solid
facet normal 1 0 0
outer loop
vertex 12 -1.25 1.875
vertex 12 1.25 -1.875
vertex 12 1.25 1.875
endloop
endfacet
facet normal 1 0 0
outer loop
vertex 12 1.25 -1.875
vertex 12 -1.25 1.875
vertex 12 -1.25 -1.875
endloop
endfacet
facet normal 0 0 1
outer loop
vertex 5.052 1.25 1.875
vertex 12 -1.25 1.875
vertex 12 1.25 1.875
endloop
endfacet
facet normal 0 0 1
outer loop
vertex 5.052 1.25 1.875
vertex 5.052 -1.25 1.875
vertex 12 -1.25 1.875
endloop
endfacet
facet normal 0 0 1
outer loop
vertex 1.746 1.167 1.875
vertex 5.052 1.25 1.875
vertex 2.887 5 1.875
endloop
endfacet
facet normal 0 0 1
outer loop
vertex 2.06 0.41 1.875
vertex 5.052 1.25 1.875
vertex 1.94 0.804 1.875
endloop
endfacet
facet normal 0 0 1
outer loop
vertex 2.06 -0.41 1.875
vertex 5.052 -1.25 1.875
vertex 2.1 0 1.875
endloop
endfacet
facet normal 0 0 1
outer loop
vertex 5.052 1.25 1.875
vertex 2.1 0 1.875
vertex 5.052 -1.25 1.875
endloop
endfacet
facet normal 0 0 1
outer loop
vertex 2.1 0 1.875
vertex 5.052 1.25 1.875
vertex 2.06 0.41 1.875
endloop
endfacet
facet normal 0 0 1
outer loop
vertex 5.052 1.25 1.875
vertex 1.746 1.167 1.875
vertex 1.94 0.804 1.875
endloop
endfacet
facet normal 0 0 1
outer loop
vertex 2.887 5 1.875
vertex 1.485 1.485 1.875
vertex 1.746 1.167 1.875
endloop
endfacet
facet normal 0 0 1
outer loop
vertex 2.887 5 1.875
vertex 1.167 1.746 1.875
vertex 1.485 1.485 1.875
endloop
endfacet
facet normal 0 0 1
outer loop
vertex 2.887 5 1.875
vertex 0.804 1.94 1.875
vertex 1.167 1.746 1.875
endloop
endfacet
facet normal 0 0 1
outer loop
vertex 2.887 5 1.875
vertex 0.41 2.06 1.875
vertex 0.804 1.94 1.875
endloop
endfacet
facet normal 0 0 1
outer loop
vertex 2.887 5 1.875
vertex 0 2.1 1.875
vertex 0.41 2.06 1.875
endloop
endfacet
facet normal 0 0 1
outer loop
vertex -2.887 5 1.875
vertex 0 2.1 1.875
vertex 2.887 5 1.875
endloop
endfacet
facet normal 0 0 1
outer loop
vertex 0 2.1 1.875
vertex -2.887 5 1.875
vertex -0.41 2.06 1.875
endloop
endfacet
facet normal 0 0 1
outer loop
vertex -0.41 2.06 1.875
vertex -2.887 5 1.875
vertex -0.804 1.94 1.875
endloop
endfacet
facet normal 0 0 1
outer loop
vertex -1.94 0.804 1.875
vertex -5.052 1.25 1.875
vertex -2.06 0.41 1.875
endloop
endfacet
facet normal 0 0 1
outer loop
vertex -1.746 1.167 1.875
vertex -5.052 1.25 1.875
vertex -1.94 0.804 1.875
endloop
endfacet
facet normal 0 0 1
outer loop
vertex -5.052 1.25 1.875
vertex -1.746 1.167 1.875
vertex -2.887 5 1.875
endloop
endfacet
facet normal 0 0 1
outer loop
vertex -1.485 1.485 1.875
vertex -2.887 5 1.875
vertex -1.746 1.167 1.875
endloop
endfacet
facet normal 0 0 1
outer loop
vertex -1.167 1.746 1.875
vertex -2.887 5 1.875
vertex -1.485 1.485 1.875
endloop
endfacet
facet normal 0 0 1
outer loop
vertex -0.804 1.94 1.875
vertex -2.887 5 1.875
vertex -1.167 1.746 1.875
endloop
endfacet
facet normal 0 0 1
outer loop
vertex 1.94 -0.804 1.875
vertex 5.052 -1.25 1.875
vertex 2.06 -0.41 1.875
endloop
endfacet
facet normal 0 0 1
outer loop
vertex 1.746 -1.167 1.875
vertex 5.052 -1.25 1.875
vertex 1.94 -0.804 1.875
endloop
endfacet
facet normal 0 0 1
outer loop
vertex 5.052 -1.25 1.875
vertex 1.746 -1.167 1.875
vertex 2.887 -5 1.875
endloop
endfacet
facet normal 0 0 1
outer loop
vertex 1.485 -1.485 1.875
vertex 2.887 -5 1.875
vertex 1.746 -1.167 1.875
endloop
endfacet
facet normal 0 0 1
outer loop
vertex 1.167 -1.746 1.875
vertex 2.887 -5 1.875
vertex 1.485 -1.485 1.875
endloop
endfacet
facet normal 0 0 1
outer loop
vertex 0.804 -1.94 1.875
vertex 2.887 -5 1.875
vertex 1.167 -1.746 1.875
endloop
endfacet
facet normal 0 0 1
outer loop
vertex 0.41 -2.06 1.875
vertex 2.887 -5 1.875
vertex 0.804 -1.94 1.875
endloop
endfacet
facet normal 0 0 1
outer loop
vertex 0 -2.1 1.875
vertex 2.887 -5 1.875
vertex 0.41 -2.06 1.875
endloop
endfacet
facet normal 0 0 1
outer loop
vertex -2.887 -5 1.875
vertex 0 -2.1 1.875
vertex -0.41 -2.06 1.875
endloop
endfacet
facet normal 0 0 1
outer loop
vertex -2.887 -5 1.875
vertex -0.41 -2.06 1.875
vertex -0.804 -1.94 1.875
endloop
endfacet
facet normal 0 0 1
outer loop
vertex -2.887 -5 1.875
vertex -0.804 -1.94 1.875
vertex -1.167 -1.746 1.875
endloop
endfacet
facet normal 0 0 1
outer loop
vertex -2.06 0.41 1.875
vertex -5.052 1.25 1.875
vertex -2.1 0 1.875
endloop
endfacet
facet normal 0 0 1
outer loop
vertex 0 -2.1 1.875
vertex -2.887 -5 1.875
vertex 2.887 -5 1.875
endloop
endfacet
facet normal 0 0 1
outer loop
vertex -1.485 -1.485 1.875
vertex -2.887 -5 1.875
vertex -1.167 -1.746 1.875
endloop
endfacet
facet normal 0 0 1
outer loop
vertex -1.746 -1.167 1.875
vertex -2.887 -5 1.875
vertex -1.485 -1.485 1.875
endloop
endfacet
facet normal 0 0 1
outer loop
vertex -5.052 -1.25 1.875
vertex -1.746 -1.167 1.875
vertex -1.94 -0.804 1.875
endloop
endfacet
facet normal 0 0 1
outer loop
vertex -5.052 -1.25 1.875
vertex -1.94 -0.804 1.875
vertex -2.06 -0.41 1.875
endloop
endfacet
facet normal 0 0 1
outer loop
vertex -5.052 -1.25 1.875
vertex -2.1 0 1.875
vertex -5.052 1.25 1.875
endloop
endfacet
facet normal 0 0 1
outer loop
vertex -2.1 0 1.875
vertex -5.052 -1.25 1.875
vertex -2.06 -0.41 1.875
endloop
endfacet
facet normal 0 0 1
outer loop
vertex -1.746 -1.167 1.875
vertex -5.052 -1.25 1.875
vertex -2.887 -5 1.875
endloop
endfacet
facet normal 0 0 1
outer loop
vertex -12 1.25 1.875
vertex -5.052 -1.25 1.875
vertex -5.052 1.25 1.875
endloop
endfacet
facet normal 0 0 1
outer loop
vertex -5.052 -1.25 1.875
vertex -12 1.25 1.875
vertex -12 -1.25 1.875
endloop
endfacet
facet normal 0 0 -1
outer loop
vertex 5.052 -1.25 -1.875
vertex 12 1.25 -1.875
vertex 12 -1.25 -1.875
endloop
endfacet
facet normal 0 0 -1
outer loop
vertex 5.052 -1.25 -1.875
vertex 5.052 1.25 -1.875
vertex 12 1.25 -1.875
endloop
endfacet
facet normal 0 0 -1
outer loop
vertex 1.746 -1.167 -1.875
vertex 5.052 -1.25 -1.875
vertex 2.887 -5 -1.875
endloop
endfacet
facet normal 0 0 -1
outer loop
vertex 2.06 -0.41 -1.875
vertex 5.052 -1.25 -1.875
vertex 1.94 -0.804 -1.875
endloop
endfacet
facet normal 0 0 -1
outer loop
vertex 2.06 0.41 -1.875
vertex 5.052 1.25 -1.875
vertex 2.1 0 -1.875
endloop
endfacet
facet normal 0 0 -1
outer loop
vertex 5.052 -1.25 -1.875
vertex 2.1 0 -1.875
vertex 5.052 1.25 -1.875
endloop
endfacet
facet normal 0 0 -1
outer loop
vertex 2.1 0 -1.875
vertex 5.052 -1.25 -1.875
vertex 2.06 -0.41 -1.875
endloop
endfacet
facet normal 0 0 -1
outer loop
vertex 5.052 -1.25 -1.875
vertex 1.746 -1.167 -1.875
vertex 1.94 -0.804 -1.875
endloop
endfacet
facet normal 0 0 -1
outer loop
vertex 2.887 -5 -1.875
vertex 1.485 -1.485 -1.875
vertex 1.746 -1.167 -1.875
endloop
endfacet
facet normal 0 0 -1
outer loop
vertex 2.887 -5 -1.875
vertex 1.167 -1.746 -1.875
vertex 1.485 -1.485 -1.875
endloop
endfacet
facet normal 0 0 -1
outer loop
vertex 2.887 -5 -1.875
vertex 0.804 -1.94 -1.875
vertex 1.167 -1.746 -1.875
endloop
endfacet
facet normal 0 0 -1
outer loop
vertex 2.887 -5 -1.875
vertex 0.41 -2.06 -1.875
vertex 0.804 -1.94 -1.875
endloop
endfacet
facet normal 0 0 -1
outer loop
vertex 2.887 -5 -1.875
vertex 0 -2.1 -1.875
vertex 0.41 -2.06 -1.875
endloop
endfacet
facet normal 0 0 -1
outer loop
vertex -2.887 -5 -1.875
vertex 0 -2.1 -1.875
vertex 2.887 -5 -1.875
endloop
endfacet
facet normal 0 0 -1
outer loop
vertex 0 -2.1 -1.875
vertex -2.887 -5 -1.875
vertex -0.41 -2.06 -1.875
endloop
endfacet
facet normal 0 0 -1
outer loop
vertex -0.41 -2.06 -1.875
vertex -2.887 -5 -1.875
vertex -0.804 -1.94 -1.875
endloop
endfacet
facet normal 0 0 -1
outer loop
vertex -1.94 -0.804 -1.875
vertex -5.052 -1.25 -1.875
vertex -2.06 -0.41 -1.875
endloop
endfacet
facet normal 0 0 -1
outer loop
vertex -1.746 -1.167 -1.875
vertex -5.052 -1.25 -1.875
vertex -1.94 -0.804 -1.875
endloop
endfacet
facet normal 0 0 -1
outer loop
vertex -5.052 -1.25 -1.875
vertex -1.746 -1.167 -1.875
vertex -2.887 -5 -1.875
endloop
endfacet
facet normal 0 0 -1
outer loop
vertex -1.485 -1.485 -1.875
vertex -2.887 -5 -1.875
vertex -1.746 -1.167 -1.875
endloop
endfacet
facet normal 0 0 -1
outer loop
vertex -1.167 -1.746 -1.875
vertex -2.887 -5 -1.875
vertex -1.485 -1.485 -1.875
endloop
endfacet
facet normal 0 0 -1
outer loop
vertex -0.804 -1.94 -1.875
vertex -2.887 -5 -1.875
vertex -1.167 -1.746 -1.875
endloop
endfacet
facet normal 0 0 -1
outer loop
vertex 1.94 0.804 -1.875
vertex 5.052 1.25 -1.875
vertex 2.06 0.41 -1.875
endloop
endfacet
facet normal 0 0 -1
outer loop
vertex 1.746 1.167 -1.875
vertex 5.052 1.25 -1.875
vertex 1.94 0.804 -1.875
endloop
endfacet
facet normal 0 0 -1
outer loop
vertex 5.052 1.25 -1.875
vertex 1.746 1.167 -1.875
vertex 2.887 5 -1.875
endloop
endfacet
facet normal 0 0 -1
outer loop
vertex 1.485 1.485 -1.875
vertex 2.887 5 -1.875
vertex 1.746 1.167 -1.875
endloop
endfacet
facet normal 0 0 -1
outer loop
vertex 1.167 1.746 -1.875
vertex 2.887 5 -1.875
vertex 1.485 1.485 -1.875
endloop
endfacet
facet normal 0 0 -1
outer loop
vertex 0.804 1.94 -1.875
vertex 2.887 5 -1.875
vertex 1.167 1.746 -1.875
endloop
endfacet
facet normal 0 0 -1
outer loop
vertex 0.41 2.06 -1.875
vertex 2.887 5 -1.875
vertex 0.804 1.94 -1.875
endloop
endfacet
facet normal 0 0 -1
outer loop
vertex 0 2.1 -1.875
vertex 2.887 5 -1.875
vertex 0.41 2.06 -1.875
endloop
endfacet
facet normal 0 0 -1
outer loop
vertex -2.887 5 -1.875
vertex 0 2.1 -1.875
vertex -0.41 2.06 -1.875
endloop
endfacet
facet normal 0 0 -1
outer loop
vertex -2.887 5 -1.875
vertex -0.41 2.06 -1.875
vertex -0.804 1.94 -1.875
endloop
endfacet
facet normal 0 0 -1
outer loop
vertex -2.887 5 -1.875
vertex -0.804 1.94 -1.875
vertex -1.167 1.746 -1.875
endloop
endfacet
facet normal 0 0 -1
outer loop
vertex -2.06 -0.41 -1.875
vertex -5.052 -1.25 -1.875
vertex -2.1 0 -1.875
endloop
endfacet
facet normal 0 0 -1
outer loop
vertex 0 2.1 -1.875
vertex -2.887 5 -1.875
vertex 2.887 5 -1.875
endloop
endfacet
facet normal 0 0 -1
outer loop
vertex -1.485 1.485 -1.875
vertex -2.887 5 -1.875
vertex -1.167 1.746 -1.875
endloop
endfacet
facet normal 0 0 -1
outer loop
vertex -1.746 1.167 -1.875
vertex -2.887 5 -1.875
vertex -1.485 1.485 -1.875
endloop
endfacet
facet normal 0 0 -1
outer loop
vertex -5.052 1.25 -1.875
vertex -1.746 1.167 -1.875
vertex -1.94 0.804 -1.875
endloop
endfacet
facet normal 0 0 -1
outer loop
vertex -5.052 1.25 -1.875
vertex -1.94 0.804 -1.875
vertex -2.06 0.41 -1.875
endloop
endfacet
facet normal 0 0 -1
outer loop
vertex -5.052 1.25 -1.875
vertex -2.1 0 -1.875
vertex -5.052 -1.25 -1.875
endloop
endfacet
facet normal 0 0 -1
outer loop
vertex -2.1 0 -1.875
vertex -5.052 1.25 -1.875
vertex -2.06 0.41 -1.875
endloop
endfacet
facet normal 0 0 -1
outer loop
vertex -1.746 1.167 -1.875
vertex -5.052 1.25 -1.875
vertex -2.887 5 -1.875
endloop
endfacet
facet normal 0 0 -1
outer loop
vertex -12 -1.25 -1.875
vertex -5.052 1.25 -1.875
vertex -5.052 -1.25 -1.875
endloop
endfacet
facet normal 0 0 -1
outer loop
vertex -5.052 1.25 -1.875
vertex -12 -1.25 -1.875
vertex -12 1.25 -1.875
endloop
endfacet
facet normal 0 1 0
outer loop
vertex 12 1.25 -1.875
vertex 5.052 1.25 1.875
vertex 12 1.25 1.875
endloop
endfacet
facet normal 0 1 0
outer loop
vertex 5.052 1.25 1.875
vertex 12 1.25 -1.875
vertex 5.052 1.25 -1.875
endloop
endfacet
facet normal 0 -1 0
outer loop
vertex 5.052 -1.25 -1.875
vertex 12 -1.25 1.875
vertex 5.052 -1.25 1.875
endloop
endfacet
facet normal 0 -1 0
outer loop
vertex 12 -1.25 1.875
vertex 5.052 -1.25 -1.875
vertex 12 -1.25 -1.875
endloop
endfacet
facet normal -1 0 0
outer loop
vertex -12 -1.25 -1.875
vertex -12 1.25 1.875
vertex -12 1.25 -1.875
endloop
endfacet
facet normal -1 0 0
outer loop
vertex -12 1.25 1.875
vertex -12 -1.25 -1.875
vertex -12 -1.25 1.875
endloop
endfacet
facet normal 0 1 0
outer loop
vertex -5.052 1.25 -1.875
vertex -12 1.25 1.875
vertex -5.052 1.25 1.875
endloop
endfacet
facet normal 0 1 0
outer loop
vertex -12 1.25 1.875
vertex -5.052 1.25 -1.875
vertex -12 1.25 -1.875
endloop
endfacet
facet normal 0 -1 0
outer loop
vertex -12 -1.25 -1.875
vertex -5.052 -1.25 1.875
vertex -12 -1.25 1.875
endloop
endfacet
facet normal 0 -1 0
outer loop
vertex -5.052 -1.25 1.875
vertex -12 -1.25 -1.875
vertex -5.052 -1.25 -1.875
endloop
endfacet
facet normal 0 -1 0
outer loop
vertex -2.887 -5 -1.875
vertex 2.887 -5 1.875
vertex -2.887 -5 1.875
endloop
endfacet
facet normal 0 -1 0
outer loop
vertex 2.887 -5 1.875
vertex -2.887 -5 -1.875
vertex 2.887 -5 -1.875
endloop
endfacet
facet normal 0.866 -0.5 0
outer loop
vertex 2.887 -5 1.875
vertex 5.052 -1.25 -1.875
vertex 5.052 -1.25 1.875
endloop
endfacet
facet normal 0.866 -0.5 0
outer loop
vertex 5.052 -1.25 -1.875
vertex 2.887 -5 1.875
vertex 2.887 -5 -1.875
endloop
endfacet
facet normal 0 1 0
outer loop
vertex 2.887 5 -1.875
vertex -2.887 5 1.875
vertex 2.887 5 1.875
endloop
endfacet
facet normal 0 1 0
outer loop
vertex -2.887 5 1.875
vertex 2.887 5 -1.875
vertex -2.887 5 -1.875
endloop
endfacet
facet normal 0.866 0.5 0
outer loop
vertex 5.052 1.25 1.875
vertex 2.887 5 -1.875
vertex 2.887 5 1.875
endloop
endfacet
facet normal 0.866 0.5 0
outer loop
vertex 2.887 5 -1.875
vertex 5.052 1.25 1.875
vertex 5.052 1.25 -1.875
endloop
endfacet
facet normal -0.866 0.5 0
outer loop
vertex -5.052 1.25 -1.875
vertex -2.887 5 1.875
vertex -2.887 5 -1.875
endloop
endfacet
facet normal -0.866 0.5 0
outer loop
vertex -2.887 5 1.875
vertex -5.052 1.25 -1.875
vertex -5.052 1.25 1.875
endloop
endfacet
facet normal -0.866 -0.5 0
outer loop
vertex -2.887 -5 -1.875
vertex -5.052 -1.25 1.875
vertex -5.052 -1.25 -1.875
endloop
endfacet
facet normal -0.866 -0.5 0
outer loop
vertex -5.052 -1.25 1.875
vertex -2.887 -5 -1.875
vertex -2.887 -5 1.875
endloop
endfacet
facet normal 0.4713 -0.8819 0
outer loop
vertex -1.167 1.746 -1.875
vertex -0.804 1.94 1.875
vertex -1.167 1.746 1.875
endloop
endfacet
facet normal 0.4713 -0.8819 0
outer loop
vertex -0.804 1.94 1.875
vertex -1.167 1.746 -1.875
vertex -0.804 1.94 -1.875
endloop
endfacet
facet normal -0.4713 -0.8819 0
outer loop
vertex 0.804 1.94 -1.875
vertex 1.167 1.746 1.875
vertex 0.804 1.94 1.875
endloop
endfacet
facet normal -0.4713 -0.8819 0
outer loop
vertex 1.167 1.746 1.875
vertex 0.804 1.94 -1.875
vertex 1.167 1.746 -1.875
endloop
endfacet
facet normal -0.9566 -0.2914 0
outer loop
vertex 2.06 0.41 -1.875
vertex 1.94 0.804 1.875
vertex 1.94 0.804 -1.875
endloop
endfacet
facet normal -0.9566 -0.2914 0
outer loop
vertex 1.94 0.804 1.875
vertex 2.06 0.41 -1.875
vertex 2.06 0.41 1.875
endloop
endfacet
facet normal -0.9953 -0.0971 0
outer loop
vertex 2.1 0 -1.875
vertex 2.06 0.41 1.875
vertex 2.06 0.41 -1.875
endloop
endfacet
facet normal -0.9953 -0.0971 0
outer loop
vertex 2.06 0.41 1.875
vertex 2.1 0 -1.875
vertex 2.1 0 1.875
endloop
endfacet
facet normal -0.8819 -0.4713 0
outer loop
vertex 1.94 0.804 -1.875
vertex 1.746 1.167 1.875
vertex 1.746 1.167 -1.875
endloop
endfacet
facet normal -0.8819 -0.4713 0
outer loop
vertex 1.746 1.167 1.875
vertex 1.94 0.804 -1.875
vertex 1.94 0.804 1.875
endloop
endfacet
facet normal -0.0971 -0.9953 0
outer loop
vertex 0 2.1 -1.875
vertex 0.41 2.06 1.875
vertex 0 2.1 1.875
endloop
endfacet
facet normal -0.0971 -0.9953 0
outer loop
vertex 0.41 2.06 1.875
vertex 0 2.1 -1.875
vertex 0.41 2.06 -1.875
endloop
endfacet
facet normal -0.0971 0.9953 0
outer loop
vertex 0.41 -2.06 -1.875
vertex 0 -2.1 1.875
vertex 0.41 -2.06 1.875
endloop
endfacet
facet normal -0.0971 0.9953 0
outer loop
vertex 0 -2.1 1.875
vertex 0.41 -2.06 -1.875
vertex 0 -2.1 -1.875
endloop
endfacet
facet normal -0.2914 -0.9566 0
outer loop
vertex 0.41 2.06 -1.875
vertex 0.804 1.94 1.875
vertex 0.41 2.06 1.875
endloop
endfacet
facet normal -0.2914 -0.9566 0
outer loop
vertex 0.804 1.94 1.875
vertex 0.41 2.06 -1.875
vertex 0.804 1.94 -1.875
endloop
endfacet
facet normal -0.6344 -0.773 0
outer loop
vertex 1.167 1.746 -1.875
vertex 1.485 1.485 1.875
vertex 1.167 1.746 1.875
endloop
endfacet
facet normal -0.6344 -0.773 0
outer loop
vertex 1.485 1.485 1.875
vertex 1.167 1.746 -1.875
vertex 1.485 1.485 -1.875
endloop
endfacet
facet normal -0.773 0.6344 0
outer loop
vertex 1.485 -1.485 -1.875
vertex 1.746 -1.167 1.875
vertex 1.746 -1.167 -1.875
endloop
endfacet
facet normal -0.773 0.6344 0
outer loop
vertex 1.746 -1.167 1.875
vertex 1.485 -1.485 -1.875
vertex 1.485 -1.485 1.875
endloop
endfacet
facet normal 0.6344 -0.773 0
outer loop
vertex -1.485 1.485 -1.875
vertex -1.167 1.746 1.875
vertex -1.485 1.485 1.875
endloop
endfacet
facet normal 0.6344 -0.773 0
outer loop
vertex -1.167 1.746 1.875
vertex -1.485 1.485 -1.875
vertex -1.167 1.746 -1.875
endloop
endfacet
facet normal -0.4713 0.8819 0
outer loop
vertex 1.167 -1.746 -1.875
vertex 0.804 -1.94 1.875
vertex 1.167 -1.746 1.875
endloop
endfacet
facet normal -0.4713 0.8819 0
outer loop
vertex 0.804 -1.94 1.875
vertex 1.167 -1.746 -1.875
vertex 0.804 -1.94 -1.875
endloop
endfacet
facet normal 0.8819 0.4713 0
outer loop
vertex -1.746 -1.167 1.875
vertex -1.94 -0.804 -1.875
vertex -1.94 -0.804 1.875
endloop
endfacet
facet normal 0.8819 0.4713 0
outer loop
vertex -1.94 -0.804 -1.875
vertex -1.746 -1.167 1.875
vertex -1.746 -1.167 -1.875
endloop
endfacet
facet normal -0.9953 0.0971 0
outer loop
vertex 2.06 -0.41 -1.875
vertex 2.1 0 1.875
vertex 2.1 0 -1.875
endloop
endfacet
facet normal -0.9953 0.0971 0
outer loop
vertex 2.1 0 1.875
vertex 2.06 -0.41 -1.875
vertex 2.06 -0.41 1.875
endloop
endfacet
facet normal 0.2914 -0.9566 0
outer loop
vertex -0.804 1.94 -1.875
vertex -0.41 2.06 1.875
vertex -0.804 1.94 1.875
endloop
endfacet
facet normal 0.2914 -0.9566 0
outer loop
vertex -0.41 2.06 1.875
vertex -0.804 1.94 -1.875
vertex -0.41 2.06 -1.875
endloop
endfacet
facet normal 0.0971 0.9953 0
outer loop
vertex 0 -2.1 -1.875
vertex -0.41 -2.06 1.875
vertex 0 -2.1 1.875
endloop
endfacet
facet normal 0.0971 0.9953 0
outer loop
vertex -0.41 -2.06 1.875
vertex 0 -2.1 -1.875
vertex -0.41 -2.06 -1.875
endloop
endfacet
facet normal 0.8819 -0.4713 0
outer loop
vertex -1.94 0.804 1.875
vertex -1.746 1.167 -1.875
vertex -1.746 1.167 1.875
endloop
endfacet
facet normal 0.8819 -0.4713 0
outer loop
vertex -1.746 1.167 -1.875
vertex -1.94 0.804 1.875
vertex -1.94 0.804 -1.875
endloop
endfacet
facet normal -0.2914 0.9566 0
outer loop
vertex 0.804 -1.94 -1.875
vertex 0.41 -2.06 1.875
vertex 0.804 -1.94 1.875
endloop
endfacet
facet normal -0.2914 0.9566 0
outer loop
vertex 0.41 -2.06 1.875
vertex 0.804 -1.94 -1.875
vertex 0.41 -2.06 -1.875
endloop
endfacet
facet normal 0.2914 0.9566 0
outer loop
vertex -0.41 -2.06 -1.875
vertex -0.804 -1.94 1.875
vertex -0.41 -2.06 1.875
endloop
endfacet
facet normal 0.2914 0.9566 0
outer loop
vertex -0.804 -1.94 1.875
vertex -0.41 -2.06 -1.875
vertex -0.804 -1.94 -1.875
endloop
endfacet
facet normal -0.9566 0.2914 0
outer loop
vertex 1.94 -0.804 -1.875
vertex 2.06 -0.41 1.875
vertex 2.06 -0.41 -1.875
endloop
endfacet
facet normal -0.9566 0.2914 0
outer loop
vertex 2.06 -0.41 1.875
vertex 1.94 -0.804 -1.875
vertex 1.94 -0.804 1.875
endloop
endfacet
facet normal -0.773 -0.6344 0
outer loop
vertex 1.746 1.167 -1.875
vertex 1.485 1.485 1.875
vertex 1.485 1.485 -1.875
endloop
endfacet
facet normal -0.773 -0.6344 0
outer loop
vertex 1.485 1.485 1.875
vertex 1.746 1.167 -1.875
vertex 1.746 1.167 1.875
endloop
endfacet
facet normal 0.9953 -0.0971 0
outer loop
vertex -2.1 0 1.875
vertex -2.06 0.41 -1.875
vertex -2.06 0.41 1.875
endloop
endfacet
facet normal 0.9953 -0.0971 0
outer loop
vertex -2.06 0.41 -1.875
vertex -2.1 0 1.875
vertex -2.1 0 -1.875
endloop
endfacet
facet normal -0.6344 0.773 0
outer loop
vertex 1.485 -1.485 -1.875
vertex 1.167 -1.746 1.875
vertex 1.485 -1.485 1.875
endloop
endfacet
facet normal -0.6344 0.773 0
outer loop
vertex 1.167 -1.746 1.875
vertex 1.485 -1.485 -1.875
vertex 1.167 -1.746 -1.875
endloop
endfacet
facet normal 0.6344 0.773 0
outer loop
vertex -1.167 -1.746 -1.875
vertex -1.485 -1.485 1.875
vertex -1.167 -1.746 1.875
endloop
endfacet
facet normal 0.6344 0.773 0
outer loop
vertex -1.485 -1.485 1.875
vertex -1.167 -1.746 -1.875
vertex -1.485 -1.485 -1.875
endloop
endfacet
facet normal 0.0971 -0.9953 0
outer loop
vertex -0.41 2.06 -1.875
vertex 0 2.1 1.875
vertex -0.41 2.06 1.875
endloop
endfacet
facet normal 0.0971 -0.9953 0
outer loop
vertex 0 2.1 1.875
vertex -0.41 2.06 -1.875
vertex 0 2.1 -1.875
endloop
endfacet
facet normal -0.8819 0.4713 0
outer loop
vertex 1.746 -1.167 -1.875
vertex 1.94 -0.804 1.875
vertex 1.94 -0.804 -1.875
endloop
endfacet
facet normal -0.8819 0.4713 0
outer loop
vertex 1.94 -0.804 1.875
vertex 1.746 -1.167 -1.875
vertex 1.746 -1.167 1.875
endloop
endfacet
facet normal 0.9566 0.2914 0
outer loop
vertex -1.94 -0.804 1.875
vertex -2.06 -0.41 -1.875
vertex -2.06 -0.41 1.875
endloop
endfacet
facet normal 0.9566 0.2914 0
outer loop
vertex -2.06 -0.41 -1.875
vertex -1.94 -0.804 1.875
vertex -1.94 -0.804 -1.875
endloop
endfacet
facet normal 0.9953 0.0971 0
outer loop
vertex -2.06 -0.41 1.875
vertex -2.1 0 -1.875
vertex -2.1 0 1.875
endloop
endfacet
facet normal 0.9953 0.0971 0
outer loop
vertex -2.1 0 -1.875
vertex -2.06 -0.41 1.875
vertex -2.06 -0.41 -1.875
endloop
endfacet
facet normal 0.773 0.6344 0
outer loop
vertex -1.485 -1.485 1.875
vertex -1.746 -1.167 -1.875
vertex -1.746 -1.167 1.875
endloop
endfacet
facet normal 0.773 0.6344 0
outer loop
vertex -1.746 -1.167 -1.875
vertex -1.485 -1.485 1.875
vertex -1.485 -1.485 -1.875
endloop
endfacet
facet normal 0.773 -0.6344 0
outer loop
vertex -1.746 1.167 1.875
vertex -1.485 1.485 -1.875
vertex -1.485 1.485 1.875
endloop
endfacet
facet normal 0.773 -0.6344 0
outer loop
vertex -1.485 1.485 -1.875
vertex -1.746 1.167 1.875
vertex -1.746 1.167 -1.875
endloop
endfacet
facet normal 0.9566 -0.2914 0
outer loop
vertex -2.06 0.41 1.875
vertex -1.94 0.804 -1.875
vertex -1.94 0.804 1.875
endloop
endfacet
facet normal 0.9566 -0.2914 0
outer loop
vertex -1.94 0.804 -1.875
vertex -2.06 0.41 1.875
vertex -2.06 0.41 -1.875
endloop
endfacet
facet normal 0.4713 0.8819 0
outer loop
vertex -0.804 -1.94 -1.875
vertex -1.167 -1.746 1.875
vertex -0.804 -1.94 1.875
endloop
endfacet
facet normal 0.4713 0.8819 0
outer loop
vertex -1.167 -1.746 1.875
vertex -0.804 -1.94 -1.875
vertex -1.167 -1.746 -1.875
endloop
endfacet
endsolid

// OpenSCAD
// Parameters
thread_diameter_mm = 4.0; //[2.0:8.0:0.1]
thread_pitch_mm = 0.7; //[0.35:1.4:0.05]
across_flats_mm = 10.0; //[5.0:20.0:0.1]
thickness_mm = 3.75; //[1.9:7.5:0.05]
thread_clearance_mm = 0.2; //[0.0:0.6:0.05]
wing_count = 2; //[2:2:1]
wing_span_mm = 24.0; //[12.0:48.0:0.5]
wing_length_from_core_mm = 7.0; //[3.5:14.0:0.25]
wing_height_mm = 3.75; //[1.9:7.5:0.05]
wing_thickness_mm = 2.5; //[1.2:5.0:0.1]
wing_tip_radius_mm = 2.0; //[0.8:4.0:0.1]
wing_root_fillet_radius_mm = 1.0; //[0.5:2.0:0.1]
outer_edge_chamfer_mm = 0.3; //[0.0:1.0:0.05]
overlap_mm = 1.0; //[0.5:2.0:0.1]
hole_extra_height_mm = 2.0; //[1.0:6.0:0.5]

// Nut and Washer - complete geometry
module nut_and_washer() {
  color([0.85, 0.85, 0.8]) {
    // Hex Nut Core
    difference() {
      union() {
        // Hexagonal core
        translate([0, 0, -thickness_mm/2])
          cylinder(r=across_flats_mm/(2*cos(30)), h=thickness_mm, $fn=6);
        
        // Wings
        union() {
          translate([across_flats_mm/2 + (wing_length_from_core_mm + overlap_mm)/2 - overlap_mm, 0, 0])
            cube([wing_length_from_core_mm + overlap_mm, wing_thickness_mm, wing_height_mm], center=true);
          translate([-(across_flats_mm/2 + (wing_length_from_core_mm + overlap_mm)/2 - overlap_mm), 0, 0])
            cube([wing_length_from_core_mm + overlap_mm, wing_thickness_mm, wing_height_mm], center=true);
        }
        
        // Wing root fillets
        hull() {
          translate([across_flats_mm/2 - overlap_mm/2, 0, 0])
            sphere(r=wing_root_fillet_radius_mm);
          translate([-(across_flats_mm/2 - overlap_mm/2), 0, 0])
            sphere(r=wing_root_fillet_radius_mm);
        }
      }
      
      // Threaded through hole
      translate([0, 0, -thickness_mm/2])
        cylinder(r=(thread_diameter_mm + thread_clearance_mm)/2, h=thickness_mm + hole_extra_height_mm, $fn=32);
    }
  }
}

// Assembly
module assembly() {
  nut_and_washer();
}

assembly();
